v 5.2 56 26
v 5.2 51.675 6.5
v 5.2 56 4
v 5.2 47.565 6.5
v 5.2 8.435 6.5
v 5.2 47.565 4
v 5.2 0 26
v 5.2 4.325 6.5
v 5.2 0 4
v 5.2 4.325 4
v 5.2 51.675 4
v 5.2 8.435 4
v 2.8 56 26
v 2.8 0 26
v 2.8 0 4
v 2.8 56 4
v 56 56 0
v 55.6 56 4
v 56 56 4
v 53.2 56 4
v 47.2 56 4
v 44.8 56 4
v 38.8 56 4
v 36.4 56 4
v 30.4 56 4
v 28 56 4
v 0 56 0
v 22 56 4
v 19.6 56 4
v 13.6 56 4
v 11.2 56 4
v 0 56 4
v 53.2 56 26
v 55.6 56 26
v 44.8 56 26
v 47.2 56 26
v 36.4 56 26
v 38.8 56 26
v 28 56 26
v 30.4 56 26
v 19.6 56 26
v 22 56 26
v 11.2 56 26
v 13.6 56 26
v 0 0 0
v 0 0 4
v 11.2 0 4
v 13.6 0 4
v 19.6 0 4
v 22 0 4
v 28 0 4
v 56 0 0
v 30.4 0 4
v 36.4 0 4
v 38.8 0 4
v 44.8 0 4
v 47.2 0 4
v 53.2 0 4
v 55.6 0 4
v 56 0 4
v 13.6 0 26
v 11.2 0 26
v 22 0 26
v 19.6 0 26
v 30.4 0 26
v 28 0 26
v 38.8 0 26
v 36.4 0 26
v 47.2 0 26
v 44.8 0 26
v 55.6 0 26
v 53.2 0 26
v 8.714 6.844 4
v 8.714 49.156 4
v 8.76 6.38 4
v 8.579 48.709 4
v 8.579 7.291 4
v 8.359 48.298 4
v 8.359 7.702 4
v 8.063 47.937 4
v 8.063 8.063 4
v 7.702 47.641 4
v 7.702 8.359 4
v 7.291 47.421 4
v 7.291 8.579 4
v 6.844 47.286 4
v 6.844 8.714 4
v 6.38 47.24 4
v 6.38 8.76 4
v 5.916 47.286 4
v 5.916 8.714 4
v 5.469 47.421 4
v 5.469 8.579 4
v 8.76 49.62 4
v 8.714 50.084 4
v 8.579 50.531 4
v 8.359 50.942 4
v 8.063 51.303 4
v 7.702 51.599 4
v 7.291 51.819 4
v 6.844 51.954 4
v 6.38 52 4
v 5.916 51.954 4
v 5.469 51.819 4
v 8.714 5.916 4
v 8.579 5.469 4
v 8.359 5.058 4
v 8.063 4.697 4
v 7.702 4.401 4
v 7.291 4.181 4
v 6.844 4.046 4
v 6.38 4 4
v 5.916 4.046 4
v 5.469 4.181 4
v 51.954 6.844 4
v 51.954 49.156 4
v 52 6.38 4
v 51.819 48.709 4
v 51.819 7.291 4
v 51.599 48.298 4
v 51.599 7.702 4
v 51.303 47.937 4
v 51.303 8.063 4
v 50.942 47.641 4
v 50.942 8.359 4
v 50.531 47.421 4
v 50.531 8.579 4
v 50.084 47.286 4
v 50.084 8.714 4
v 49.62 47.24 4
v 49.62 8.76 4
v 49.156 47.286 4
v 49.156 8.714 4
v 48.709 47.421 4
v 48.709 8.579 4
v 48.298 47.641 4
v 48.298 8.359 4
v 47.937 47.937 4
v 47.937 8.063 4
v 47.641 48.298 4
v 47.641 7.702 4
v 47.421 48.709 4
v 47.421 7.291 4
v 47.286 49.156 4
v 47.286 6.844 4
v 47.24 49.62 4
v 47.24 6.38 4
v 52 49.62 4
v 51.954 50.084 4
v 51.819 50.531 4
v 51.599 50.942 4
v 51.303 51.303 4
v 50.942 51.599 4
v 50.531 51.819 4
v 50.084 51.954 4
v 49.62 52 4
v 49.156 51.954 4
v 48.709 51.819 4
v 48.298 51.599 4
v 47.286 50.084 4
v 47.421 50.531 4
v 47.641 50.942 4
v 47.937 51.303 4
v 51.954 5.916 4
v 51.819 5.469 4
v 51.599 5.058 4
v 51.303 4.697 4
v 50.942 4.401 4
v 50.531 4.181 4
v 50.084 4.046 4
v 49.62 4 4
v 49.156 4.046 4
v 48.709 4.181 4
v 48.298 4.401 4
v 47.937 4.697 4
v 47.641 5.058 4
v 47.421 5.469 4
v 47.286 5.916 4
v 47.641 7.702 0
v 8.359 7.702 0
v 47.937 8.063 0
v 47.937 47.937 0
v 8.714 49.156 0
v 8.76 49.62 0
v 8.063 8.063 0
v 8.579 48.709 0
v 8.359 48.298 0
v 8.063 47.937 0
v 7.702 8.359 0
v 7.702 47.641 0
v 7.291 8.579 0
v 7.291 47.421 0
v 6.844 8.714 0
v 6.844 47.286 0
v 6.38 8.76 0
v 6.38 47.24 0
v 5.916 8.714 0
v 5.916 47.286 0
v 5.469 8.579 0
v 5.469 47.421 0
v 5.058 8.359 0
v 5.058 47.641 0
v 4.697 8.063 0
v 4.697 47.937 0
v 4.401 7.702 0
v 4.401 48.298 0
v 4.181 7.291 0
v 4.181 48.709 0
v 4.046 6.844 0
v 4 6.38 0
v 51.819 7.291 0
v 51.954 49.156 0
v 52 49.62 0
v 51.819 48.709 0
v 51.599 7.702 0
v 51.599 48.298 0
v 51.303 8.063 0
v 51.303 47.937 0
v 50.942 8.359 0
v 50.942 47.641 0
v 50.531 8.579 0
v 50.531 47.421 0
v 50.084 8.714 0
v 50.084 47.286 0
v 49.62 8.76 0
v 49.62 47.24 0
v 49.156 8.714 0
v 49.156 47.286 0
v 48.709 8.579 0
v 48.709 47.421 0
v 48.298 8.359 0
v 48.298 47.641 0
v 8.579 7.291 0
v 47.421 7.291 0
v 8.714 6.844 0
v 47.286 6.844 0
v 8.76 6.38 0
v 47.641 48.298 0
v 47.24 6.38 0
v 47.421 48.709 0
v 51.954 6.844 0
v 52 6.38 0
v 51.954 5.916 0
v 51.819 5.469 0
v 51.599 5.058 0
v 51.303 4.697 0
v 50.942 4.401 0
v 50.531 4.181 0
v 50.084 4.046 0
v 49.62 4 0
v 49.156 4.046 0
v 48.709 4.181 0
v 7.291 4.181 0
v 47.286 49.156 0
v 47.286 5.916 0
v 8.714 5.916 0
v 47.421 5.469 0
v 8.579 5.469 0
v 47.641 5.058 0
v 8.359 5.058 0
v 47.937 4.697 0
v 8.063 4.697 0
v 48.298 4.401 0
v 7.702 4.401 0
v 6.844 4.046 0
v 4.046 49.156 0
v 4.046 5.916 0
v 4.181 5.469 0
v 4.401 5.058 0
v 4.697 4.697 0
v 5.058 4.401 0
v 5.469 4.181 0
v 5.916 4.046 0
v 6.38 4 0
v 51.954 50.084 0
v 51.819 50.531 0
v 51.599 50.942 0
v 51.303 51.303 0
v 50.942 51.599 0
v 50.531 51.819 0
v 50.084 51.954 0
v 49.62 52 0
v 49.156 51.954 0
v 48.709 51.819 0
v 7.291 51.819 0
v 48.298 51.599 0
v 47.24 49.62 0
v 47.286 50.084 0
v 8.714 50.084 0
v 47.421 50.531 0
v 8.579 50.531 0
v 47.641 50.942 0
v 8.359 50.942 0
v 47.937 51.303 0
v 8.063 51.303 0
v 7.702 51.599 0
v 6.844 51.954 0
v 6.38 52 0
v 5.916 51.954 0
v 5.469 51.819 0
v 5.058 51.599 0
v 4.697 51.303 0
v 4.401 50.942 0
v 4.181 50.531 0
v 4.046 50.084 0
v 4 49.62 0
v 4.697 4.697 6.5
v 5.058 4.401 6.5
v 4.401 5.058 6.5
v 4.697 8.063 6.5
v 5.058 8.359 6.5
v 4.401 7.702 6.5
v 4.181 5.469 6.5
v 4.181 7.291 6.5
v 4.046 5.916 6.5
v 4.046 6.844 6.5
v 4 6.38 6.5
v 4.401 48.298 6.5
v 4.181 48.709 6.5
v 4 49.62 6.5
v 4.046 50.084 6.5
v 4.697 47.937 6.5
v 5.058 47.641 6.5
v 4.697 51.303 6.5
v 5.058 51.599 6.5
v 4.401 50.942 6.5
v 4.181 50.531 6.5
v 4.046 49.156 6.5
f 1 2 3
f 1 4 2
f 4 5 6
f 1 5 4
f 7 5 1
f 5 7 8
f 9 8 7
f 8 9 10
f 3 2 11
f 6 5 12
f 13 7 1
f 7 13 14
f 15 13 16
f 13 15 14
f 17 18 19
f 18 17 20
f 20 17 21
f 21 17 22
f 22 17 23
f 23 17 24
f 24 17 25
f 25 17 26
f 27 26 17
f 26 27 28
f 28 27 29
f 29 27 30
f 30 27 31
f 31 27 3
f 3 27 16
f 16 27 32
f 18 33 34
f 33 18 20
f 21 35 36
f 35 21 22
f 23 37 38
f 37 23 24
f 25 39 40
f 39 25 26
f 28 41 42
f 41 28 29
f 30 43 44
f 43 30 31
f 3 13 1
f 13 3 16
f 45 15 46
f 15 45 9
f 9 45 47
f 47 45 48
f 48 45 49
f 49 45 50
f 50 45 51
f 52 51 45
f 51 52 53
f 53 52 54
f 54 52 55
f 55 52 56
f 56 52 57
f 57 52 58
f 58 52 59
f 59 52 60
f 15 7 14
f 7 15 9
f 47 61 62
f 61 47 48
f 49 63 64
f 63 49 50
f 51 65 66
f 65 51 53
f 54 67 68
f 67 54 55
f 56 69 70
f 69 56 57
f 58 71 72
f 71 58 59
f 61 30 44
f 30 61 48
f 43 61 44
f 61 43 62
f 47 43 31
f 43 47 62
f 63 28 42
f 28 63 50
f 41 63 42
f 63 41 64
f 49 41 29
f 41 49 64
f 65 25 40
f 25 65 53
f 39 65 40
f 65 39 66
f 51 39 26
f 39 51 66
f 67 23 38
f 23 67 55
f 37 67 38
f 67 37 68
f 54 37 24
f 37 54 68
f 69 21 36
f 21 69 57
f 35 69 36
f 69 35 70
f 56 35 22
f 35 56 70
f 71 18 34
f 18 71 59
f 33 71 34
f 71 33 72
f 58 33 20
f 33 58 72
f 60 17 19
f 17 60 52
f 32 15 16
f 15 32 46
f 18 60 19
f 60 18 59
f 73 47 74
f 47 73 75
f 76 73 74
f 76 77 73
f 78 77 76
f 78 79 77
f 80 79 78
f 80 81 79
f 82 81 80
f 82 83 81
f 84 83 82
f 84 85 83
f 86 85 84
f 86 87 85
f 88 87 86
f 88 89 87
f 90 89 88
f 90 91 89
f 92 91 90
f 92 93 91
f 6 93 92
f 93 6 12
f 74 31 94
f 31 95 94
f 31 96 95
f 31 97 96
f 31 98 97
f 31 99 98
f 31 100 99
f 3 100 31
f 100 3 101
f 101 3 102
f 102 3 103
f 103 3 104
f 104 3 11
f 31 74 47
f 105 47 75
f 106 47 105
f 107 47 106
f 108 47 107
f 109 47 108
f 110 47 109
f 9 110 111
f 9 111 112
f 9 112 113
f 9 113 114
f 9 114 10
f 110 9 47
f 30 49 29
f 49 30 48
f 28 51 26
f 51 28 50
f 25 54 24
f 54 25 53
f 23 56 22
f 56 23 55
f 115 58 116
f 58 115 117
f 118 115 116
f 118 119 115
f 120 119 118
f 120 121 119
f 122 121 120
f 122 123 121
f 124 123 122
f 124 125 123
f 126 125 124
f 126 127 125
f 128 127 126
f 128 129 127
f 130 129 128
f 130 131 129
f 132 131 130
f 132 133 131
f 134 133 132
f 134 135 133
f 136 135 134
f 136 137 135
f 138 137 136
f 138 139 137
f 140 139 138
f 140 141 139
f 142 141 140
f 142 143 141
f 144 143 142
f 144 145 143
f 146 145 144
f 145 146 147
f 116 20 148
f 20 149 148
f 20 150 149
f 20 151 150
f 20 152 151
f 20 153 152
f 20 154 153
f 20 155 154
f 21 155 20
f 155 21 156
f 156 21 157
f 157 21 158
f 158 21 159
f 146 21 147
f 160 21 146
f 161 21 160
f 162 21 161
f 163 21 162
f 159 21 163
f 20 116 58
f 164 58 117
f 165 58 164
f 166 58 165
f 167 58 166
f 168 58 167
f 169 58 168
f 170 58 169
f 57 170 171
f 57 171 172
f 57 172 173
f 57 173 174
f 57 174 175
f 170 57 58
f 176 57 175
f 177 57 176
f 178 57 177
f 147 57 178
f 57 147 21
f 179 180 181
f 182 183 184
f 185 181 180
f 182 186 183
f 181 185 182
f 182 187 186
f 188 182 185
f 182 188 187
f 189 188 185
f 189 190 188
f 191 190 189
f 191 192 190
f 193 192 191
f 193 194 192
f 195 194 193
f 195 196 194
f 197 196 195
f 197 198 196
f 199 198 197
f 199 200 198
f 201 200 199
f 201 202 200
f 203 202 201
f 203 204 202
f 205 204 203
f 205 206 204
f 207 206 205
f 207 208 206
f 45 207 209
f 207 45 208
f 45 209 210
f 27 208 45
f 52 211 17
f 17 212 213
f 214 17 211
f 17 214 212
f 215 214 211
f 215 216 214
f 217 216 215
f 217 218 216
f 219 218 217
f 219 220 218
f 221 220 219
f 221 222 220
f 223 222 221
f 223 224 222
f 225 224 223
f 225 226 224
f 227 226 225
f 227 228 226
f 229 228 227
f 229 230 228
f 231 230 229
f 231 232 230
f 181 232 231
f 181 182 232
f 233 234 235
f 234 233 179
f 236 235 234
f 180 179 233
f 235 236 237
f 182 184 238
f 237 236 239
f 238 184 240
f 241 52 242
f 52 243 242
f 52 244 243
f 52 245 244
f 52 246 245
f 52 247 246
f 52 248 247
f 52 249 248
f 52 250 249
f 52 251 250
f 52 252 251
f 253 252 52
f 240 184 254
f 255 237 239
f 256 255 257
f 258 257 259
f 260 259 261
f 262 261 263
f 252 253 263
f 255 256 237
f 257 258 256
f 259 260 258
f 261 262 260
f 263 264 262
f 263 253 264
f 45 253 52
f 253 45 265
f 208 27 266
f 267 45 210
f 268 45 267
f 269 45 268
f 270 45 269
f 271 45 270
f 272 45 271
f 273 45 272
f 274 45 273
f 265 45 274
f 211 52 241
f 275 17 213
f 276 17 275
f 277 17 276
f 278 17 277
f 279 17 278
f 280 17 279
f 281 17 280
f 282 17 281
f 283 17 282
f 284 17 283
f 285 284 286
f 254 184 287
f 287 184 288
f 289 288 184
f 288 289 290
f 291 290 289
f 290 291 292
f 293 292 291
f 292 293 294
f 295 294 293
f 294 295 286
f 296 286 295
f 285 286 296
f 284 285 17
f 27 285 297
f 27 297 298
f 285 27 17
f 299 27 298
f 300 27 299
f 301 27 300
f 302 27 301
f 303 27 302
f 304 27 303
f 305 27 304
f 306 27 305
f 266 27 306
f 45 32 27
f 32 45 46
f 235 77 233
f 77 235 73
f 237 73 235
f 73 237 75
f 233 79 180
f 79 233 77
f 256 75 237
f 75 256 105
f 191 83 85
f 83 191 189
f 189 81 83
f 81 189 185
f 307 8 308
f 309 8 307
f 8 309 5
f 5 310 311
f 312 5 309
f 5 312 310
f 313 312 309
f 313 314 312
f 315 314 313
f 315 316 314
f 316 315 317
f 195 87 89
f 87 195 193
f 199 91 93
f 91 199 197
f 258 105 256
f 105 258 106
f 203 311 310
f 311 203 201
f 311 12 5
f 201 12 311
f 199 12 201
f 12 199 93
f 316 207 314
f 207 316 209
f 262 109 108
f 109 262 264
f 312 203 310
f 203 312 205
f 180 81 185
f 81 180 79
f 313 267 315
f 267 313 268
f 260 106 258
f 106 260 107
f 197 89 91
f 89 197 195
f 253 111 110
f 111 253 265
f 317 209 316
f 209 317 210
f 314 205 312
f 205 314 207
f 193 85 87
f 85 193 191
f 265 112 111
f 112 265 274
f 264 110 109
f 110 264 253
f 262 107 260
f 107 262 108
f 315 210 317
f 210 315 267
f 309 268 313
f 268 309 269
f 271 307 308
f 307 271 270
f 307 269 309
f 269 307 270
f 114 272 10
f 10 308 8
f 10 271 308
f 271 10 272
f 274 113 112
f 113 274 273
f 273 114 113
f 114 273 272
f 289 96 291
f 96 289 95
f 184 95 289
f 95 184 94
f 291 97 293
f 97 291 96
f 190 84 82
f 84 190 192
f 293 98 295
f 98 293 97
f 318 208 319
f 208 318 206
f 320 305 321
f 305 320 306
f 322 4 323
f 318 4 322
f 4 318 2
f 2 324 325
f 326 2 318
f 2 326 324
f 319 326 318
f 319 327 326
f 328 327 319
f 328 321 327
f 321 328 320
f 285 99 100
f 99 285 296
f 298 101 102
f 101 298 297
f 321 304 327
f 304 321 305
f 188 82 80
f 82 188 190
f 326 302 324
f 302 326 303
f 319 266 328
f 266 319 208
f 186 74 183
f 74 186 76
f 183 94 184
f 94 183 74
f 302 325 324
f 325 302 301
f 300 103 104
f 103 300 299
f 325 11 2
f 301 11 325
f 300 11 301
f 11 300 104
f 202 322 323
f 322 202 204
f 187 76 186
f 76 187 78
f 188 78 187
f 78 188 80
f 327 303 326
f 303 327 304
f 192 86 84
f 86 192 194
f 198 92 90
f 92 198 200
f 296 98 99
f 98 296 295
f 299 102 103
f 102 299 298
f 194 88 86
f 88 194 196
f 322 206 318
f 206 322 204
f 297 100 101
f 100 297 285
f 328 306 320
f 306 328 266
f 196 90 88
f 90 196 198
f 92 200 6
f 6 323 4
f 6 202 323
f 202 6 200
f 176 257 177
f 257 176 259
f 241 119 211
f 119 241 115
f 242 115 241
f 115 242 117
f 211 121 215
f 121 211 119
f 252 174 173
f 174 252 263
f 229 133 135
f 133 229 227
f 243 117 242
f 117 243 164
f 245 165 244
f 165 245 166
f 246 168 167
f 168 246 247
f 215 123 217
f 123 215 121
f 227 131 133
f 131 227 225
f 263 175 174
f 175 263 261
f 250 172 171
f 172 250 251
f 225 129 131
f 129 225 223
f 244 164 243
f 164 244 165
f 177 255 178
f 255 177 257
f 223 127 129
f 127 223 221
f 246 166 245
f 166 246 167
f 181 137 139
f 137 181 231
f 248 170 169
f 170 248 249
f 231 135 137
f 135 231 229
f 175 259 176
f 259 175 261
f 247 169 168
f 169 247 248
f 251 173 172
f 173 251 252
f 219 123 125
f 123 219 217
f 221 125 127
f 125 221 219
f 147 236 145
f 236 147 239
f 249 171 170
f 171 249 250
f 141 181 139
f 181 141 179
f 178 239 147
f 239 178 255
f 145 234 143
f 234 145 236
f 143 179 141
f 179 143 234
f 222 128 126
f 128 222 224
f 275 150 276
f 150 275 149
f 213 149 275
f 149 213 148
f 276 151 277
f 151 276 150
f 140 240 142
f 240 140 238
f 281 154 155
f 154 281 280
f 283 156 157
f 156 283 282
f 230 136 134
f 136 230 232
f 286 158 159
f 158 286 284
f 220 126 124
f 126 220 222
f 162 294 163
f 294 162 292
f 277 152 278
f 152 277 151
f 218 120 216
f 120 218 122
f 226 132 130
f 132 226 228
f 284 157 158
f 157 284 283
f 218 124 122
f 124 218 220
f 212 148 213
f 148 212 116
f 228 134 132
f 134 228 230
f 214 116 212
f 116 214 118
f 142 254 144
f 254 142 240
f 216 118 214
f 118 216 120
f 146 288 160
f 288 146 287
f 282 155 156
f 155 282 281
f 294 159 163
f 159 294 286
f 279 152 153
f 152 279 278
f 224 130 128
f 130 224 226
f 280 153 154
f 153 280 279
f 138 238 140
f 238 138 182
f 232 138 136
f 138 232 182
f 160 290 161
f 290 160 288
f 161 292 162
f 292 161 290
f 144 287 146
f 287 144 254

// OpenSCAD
$fn = 32;

// ----------------------------------------------------------------------
// Finned heat sink: 56 x 56 mm base, 22 mm fins
// ----------------------------------------------------------------------

// --- parameters (mm) ---
base_w = 56;              // base width
base_d = 56;              // base depth
base_t = 4;               // base thickness
fin_h = 22;               // fin height above the base
holes_d = 4.76;           // fixing holes
hole_x = 21.62;           // hole offset in x
hole_y = 21.62;           // hole offset in y
fin_t = 2.4;              // fin thickness
fin_pitch = 8.4;          // fin pitch
fin_count = 7;            // number of fins
fin_x0 = 2.8;             // first fin offset

difference() {
  union() {
    cube([base_w, base_d, base_t]);
    for (i = [0 : fin_count - 1]) {
      translate([fin_x0 + i * fin_pitch, 0, base_t - 0.5]) cube([fin_t, base_d, fin_h + 0.5]);
    }
  }
  /* fixing holes through the base, 2.5 mm clear on both sides */
  for (hx = [-21.62, 21.62]) {
    for (hy = [-21.62, 21.62]) {
      translate([base_w / 2 + hx, base_d / 2 + hy, -2.5]) cylinder(h = base_t + 5, d = holes_d);
    }
  }
}
